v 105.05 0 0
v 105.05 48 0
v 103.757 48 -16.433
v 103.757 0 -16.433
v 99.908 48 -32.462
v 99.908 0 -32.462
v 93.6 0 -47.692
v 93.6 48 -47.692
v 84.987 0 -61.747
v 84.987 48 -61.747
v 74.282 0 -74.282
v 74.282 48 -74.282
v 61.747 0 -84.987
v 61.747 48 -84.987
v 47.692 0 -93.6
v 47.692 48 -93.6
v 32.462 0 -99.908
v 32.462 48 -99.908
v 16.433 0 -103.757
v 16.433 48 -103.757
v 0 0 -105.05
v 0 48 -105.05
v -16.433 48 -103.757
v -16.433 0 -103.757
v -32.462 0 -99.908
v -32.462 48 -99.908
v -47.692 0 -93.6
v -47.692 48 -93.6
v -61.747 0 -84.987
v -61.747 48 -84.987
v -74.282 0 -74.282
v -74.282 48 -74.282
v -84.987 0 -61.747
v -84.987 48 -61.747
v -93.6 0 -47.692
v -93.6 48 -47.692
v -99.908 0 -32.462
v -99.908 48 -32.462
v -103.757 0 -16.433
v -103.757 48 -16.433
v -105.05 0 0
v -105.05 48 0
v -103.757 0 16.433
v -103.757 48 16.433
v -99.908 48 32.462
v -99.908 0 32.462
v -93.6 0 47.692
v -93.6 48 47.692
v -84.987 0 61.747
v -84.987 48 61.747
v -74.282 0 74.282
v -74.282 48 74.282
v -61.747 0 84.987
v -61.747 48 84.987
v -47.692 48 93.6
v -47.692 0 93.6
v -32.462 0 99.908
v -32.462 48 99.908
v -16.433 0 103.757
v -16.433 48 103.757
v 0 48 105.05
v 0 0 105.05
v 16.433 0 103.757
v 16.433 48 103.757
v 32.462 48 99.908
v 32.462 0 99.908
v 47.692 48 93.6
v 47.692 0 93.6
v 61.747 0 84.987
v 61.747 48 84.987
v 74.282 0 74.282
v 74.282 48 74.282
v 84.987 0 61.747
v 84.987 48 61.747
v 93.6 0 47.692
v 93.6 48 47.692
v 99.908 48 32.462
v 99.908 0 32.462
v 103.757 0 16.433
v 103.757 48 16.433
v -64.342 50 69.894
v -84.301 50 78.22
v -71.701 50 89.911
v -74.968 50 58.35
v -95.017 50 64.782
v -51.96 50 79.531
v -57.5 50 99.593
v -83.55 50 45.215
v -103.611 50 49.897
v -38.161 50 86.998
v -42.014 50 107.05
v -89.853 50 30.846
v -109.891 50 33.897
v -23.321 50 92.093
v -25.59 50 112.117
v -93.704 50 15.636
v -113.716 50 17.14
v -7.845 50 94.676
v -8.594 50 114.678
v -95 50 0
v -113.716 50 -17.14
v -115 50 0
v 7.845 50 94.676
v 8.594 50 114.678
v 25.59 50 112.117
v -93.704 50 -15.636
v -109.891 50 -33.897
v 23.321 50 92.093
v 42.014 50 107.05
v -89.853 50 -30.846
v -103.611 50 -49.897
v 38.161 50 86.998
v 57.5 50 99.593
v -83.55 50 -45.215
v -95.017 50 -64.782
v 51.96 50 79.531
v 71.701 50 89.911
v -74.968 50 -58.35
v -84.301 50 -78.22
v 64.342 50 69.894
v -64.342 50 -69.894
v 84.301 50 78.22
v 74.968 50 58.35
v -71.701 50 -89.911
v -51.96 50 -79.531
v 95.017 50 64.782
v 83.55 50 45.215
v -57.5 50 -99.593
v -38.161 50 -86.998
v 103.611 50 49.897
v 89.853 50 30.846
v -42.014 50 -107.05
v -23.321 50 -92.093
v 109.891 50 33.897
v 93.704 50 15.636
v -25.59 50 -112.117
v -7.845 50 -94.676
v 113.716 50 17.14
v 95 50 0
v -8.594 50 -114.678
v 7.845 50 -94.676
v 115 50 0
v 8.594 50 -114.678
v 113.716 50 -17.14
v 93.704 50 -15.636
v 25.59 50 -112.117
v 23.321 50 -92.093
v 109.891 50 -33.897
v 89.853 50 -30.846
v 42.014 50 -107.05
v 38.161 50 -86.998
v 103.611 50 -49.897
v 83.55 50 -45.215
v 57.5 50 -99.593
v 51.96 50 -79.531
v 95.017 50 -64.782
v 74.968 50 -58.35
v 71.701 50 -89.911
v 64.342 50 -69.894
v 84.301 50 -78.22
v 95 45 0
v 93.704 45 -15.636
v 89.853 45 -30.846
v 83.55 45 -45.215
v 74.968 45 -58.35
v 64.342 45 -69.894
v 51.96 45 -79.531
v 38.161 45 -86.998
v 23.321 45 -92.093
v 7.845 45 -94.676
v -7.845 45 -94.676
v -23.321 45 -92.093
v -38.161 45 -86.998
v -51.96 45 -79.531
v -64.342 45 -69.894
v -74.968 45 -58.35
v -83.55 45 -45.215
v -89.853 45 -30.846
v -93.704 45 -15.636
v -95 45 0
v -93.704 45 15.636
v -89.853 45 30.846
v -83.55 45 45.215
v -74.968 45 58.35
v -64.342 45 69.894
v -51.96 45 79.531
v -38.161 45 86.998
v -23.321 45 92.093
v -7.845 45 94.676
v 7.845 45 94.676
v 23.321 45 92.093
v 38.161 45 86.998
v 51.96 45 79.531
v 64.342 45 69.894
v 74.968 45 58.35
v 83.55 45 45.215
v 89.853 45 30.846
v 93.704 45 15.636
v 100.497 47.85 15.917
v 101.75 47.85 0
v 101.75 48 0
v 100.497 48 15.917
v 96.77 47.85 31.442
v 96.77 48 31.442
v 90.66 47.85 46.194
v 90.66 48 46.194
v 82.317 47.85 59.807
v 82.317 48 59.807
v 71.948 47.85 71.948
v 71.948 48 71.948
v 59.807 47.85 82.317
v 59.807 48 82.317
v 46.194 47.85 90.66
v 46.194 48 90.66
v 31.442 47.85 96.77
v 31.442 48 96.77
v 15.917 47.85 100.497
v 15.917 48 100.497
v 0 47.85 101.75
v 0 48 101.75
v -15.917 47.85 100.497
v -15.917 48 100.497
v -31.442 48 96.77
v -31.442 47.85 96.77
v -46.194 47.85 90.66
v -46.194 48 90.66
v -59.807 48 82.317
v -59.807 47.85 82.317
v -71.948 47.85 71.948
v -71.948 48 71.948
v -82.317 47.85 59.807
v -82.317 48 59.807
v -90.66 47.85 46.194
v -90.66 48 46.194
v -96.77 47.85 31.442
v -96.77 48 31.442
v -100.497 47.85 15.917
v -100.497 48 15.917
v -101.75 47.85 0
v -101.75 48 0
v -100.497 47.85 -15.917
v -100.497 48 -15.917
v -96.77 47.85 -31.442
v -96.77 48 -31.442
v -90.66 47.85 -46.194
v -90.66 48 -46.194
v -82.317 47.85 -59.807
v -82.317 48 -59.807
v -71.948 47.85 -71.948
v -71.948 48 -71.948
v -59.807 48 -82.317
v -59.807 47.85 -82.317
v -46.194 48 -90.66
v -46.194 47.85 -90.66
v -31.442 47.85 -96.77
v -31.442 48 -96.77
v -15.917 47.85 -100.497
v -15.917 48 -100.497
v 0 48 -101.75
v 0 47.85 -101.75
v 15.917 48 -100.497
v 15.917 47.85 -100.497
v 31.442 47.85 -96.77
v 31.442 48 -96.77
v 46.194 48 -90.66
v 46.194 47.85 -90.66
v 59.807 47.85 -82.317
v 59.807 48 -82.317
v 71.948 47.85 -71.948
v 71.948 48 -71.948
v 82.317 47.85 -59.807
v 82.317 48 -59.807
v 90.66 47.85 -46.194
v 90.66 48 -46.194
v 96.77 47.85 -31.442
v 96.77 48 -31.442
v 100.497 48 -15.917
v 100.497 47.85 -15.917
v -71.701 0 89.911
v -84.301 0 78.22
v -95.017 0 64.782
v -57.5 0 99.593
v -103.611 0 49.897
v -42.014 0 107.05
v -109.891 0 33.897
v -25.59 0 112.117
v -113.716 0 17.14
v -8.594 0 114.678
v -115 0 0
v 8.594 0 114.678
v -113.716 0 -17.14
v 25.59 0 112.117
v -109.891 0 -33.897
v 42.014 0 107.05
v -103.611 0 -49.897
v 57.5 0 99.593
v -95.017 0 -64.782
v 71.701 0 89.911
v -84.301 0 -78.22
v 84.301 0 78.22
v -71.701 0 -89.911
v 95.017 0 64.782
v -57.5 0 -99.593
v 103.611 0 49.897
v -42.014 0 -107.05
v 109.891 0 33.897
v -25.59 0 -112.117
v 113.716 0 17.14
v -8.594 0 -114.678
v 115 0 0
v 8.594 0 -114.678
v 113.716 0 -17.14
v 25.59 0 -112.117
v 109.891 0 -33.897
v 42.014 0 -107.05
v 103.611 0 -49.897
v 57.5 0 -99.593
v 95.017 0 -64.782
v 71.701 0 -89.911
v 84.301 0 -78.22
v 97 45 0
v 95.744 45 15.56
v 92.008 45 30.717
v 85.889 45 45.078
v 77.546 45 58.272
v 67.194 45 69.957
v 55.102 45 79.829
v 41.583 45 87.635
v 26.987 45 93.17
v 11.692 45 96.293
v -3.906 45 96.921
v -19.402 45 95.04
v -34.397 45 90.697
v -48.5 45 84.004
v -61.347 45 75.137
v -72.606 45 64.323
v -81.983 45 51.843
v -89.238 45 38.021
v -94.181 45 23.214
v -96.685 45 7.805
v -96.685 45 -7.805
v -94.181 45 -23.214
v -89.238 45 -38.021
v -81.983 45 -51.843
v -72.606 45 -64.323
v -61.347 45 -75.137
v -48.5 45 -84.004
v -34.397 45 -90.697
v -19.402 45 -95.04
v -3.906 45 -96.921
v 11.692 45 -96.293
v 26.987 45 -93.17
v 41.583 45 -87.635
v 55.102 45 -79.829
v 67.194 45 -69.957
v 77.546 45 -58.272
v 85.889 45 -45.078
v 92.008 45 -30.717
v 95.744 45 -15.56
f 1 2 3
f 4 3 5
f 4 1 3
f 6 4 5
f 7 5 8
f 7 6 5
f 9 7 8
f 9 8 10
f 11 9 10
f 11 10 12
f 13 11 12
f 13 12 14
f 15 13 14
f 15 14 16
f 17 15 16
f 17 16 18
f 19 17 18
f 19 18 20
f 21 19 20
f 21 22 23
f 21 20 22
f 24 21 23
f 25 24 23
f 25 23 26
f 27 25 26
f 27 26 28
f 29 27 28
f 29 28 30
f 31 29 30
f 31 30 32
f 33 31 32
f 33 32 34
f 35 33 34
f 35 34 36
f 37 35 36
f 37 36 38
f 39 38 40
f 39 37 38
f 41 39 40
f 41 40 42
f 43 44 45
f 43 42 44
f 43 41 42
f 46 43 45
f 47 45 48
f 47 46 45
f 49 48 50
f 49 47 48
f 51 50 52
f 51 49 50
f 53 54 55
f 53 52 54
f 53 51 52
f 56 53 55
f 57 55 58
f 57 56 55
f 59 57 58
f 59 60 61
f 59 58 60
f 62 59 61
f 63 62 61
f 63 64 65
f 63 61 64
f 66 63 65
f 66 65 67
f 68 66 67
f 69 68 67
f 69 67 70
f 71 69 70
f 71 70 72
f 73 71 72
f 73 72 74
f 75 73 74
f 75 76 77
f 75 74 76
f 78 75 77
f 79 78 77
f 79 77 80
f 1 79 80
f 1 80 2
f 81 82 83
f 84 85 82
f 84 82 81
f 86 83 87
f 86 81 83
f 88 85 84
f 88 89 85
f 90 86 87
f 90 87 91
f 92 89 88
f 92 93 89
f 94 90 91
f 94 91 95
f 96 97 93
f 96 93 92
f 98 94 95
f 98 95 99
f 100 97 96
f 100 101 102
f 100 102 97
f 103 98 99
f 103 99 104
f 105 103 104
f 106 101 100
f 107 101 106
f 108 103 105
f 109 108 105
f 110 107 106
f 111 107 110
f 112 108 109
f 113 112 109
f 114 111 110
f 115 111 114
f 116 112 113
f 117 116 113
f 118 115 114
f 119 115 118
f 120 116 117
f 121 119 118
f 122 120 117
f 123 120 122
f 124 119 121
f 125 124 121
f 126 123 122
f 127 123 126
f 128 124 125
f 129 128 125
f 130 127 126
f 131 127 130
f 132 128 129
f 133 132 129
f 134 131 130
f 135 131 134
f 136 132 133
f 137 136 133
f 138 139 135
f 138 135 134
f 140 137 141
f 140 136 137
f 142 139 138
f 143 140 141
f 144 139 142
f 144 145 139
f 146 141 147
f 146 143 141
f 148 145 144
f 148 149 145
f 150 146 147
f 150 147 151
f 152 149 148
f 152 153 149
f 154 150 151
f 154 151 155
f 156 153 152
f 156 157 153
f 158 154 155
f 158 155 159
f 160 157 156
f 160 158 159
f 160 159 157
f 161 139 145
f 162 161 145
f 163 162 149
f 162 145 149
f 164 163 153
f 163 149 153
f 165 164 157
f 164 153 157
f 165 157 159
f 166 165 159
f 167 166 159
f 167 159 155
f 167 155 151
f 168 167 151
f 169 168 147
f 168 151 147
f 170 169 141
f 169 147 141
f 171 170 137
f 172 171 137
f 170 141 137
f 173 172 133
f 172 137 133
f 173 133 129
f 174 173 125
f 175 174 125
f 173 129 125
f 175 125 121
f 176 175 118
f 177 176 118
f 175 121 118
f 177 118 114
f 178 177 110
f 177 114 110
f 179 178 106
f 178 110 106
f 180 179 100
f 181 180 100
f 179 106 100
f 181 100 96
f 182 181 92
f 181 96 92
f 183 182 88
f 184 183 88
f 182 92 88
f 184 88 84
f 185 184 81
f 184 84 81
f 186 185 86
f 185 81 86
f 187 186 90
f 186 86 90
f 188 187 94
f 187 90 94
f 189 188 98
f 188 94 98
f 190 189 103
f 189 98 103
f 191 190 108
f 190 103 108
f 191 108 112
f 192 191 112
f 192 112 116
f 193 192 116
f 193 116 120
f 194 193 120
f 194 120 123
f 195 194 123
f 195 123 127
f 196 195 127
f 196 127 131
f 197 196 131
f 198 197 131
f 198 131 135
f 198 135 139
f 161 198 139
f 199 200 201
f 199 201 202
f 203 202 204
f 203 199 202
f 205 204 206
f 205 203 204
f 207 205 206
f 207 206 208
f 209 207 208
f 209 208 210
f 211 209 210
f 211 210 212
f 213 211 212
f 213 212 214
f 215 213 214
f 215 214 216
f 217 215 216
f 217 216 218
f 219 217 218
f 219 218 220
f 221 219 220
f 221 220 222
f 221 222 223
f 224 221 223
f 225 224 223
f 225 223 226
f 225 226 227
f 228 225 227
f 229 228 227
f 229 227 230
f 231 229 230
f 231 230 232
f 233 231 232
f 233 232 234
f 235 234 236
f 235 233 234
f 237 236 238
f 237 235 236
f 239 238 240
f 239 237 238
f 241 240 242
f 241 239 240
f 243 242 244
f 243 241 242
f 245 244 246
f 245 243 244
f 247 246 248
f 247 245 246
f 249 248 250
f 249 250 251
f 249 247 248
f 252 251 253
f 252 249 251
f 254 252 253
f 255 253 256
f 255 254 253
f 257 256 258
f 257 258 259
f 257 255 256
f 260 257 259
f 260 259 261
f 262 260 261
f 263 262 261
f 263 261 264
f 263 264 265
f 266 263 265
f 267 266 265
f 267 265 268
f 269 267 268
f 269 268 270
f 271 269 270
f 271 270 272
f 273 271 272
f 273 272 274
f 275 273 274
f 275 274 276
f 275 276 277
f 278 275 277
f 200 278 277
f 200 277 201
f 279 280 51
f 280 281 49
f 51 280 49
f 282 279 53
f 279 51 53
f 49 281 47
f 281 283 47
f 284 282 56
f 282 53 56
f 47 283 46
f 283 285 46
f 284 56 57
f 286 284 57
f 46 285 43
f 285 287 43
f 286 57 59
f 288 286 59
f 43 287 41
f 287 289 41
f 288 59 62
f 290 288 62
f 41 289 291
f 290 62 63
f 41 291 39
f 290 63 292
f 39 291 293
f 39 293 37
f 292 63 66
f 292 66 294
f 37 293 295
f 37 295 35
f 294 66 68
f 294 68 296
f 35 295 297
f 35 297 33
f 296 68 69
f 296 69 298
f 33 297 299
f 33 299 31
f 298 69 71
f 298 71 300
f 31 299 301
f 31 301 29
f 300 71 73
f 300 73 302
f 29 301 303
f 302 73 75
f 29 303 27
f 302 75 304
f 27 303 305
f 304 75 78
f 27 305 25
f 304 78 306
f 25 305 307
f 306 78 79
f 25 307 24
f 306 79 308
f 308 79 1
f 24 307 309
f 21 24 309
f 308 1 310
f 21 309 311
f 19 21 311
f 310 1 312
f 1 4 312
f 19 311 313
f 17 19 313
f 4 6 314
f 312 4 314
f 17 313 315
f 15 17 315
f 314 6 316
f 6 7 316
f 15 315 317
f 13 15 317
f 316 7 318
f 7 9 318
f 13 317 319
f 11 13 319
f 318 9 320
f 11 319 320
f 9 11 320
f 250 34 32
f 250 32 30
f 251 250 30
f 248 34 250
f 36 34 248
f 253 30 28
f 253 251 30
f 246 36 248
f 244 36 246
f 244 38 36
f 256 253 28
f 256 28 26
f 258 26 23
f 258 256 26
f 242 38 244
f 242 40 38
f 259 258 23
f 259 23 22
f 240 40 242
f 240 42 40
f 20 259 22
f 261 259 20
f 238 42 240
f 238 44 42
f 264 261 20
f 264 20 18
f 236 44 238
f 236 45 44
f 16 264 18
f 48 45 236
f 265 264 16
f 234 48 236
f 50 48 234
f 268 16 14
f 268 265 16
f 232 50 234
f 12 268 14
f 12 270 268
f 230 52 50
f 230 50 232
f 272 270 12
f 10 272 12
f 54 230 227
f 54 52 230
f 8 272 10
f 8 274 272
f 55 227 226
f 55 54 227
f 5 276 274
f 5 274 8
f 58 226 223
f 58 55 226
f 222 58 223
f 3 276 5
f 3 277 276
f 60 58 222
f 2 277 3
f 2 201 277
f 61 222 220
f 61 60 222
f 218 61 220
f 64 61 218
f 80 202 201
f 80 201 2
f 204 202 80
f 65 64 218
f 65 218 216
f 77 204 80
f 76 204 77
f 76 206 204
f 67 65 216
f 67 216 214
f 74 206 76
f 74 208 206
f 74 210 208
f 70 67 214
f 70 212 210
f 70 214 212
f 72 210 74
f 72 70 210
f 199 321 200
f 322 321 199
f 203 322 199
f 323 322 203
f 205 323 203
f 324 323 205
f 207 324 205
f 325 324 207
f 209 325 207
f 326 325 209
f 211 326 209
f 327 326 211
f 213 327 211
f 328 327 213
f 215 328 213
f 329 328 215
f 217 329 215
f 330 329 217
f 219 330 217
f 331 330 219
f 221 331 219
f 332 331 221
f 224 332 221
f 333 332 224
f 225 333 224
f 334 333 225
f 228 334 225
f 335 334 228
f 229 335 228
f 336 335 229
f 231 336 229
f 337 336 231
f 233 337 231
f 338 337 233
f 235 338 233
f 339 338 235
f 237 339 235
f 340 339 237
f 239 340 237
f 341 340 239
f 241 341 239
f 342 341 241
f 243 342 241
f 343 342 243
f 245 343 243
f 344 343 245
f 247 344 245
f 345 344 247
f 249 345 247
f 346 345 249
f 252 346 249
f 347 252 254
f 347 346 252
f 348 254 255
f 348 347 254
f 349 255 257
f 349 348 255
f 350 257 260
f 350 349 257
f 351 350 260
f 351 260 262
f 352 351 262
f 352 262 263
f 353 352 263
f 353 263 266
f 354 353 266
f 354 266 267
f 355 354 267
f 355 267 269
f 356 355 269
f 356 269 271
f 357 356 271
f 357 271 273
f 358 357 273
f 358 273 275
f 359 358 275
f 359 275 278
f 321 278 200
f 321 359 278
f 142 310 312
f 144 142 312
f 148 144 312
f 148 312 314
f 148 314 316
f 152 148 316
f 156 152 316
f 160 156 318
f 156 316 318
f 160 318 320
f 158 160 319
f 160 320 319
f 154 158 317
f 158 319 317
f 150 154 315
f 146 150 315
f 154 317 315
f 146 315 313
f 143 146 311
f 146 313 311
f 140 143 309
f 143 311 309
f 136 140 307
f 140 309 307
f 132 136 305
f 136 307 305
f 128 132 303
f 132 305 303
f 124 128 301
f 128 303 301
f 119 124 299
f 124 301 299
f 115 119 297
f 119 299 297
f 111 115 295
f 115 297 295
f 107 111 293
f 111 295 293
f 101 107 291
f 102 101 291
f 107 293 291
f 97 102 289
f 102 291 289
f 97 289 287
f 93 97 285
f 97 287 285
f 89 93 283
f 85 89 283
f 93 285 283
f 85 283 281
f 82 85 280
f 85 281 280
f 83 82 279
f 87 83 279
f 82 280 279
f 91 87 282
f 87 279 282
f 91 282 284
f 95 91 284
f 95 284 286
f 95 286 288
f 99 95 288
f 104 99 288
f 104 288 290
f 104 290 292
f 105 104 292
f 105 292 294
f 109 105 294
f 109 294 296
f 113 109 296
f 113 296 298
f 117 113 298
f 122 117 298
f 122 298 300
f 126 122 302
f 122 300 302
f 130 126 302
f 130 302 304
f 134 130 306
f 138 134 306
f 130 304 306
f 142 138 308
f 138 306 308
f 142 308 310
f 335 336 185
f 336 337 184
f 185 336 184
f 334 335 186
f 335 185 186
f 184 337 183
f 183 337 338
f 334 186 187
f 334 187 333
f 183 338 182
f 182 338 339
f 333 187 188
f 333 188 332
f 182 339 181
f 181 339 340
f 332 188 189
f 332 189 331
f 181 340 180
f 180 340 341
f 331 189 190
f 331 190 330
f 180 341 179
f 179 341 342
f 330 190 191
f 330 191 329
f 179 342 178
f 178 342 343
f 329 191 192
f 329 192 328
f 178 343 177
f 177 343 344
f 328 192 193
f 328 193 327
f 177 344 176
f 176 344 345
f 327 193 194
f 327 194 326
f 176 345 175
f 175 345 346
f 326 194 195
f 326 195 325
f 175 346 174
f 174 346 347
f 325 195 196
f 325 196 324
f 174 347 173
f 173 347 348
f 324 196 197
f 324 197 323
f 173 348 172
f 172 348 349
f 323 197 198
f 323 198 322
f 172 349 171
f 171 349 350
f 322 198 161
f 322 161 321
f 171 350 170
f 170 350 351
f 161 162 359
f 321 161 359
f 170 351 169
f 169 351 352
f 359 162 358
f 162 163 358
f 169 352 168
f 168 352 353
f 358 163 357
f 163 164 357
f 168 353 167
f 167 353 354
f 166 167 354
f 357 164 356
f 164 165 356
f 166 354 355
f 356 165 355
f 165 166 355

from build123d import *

# Parameters (mm, degrees)
SKETCH1_R           = 115
SKETCH1_R_2         = 105.05
BOSS_EXTRUDE1_DEPTH = 50
SKETCH2_R           = 105.05
SKETCH2_R_2         = 95
BOSS_EXTRUDE2_DEPTH = 5
SKETCH3_R           = 105.05
SKETCH3_R_2         = 101.75
CUT_EXTRUDE1_DEPTH  = 3


with BuildPart() as part:
    # Sketch1 → Boss-Extrude1 (new body)
    with BuildSketch(Plane(origin=(0, 0, 0), x_dir=(1, 0, 0), z_dir=(0, 1, 0))):
        Circle(SKETCH1_R)
        Circle(SKETCH1_R_2, mode=Mode.SUBTRACT)
    extrude(amount=BOSS_EXTRUDE1_DEPTH)

    # Sketch2 → Boss-Extrude2 (add)
    with BuildSketch(Plane(origin=(0, 50, 0), x_dir=(1, 0, 0), z_dir=(0, 1, 0))):
        Circle(SKETCH2_R)
        Circle(SKETCH2_R_2, mode=Mode.SUBTRACT)
    extrude(amount=-BOSS_EXTRUDE2_DEPTH)

    # Sketch3 → Cut-Extrude1 (cut)
    with BuildSketch(Plane.XZ.offset(-45)):
        Circle(SKETCH3_R)
        Circle(SKETCH3_R_2, mode=Mode.SUBTRACT)
    extrude(amount=-CUT_EXTRUDE1_DEPTH, mode=Mode.SUBTRACT)

    # Sketch6 → Cut-Revolve1 (revolve, cut)
    with BuildSketch(Plane.XY):
        Polygon((102, 48), (97, 45), (102, 45), align=None)
    revolve(axis=Axis((0, 48, 0), (0, -1, 0)), mode=Mode.SUBTRACT)


solid = part.part
